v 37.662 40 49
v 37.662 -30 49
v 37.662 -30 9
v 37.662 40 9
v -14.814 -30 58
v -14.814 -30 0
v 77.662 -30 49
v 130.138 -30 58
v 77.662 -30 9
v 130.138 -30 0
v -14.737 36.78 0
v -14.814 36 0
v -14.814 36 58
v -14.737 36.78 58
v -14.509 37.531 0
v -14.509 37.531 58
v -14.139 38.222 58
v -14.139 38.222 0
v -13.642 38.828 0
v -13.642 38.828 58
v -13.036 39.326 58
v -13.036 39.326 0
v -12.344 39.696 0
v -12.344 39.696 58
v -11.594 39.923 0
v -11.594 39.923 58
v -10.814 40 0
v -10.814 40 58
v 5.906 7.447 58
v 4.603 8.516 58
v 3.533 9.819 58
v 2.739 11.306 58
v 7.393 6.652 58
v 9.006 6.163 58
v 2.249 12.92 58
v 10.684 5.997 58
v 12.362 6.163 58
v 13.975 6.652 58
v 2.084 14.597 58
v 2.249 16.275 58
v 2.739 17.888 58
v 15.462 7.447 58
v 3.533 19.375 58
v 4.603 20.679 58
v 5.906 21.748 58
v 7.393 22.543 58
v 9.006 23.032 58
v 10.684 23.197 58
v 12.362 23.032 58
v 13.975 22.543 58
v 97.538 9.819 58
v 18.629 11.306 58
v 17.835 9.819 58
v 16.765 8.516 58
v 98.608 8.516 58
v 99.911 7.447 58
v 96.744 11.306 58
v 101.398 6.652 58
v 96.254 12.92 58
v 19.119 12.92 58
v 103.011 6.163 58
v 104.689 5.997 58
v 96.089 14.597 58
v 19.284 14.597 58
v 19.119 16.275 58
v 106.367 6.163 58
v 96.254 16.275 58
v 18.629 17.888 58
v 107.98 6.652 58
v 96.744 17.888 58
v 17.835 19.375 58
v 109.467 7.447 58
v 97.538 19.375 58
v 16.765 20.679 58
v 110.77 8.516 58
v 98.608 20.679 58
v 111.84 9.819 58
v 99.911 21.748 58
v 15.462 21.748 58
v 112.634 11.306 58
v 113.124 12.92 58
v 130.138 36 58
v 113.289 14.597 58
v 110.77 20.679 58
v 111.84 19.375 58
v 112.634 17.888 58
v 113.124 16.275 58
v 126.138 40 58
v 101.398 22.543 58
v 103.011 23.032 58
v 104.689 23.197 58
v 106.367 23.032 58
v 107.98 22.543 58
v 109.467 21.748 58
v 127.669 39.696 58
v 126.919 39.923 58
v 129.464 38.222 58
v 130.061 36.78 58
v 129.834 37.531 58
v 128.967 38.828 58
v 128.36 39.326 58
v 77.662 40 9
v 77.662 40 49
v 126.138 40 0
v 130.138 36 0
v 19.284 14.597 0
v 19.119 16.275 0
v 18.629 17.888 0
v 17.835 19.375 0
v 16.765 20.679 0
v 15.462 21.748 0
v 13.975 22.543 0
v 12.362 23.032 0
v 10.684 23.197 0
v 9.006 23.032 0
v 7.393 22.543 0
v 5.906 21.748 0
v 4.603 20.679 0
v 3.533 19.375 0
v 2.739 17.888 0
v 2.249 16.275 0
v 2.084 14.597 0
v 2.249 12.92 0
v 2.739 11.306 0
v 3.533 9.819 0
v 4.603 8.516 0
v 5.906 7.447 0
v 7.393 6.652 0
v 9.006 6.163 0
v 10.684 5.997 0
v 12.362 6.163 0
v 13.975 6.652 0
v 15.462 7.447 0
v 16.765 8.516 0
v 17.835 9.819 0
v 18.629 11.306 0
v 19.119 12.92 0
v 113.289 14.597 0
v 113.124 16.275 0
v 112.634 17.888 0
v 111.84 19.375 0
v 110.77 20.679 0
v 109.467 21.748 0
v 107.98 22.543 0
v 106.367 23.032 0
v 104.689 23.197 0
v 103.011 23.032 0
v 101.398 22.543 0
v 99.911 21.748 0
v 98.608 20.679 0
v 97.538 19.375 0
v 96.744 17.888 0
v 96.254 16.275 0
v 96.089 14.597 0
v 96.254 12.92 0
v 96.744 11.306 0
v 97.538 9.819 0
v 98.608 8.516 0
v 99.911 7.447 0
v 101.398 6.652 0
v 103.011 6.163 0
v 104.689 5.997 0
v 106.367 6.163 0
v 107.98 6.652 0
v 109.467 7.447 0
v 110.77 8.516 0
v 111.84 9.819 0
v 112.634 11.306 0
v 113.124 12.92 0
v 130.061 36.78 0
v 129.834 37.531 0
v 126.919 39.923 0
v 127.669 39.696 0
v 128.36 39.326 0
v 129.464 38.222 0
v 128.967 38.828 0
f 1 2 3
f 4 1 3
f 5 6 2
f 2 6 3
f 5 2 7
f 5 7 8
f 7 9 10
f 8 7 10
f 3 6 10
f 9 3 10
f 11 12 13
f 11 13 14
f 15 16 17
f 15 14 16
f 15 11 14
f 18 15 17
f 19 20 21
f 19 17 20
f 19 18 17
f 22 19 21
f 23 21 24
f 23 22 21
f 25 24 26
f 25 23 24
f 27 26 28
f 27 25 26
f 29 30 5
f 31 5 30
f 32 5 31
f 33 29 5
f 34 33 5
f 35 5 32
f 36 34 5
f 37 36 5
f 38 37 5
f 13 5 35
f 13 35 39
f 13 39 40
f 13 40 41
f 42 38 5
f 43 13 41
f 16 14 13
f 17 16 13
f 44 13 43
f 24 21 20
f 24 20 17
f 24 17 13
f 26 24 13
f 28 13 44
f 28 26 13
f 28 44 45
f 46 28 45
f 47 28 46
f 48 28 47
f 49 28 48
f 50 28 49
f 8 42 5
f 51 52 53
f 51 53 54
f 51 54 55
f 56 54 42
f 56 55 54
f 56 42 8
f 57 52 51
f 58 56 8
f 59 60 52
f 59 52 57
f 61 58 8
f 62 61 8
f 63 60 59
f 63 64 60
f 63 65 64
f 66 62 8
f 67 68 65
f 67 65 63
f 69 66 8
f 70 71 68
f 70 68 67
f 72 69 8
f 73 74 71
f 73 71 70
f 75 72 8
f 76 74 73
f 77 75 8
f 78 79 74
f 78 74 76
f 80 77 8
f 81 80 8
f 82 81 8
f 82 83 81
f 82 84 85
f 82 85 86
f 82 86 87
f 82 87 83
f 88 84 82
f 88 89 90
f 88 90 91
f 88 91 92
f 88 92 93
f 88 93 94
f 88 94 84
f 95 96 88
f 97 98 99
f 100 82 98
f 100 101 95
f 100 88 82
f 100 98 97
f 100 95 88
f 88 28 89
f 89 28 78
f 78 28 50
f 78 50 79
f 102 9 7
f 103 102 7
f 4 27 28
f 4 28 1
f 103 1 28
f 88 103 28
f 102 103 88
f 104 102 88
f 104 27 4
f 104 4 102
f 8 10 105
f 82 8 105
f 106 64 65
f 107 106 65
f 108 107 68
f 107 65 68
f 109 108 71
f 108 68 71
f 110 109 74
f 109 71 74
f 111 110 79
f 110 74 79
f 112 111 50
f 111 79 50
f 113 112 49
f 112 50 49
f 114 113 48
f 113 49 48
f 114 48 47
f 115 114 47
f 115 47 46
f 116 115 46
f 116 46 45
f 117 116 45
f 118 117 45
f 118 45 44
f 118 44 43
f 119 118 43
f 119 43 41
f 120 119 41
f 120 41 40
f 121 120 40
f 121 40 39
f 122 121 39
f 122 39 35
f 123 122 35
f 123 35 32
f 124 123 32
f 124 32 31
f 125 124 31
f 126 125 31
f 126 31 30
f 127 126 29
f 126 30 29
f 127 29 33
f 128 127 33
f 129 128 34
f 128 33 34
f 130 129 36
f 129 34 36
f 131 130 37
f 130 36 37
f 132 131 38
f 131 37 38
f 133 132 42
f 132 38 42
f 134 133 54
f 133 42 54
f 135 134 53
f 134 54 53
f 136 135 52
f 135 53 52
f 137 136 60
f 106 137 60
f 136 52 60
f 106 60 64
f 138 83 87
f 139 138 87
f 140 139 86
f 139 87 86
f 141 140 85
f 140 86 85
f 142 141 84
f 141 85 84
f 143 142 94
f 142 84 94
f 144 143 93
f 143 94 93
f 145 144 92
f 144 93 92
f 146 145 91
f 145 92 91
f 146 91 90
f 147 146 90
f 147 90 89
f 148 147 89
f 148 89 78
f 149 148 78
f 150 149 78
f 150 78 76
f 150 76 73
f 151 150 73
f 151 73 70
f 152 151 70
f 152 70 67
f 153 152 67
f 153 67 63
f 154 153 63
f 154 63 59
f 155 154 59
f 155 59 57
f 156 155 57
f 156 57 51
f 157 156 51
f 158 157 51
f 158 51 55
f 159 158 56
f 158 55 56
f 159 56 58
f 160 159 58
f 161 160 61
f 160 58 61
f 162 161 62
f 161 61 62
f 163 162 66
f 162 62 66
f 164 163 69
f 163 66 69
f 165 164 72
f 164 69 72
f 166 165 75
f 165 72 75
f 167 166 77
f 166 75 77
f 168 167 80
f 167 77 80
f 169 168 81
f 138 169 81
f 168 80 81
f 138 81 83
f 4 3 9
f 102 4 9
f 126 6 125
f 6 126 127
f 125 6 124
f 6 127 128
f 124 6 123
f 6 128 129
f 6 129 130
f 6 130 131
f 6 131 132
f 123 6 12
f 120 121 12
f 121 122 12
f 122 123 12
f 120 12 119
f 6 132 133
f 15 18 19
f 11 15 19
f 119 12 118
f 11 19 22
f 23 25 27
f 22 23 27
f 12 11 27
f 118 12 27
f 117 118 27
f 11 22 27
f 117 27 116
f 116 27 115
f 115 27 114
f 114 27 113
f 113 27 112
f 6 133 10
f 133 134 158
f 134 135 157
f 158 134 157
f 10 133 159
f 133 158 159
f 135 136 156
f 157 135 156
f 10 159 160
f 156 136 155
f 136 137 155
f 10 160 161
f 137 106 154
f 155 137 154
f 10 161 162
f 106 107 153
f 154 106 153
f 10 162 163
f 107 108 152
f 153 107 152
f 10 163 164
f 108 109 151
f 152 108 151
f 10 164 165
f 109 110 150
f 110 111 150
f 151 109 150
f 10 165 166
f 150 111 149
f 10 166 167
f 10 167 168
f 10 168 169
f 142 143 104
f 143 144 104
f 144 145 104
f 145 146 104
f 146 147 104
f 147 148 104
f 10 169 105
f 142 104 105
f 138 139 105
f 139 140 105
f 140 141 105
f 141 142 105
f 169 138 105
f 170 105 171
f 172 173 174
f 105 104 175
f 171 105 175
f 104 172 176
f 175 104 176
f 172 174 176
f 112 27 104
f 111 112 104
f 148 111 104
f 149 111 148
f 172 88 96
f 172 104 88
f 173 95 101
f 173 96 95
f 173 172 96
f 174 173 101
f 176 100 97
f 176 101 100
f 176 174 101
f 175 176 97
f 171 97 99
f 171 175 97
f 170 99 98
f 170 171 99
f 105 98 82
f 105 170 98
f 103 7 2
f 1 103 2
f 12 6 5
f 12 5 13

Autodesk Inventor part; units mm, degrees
ref_plane "YZ Plane" through (0, 0, 0) normal (1, 0, 0) x (0, 1, 0)
ref_plane "XZ Plane" through (0, 0, 0) normal (0, 1, 0) x (-1, 0, 0)
ref_plane "XY Plane" through (0, 0, 0) normal (0, 0, 1) x (1, 0, 0)
sketch "Sketch1" plane through (0, 0, 0) normal (0, 0, 1) x (1, 0, 0)
  line L0 (130.1382, 2) -> (130.1382, 24.0208)
  line L1 (114.1591, 40) -> (3.1591, 40)
  line L2 (1.1591, -30) -> (130.1382, -30)
  line L3 (130.1382, -30) -> (130.1382, 2)
  line L4 (1.1591, -30) -> (-14.8135, -30)
  line L5 (-14.8135, -30) -> (-14.8135, 37.6368)
  line L6 (114.1591, 40) -> (126.1382, 40)
  line L7 (130.1382, 36) -> (130.1382, 24.0208)
  line L8 (126.1382, 40) -> (126.1382, 40)
  line L9 (130.1382, 36) -> (130.1382, 36)
  line L10 (-14.8135, 37.6368) -> (-14.8135, 36)
  line L11 (-10.8135, 40) -> (3.1591, 40)
  arc A0 (-10.8135, 40) -> (-14.8135, 36) centre (-10.8135, 36) ccw
  arc A1 (130.1382, 36) -> (126.1382, 40) centre (126.1382, 36) ccw
  circle A2 centre (104.5, 18) radius 8.6
  circle A3 centre (10.5, 18) radius 8.6
  point P0 (130.1382, 40)
  point P1 (-14.8135, 40)
  dimension "d41" = 4
extrude "Extrusion1" add sketch "Sketch1" along normal blind 58 contours L3 L2 L4 L5 A0 L11 L1 L6 A1 L7 L0 | A2 | A3
sketch "Sketch3" plane through (0, 0, 58) normal (0, 0, 1) x (1, 0, 0)
  circle A0 centre (104.5, 18) radius 10.5 projected
  circle A1 centre (10.495, 18) radius 10.5
  point P0 (0, 0)
  dimension "d28" = 21
extrude "Extrusion3" cut sketch "Sketch3" against normal blind 90 contours A1
sketch "Sketch4" plane through (-14.8135, 40, 0) normal (0, 1, 0) x (1, 0, 0)
  line L0 (52.4758, -29) -> (52.4758, -9)
  line L1 (52.4758, -9) -> (72.4758, -9)
  line L2 (52.4758, -9) -> (92.4758, -9)
  line L3 (92.4758, -9) -> (92.4758, -49)
  line L4 (92.4758, -49) -> (52.4758, -49)
  line L5 (52.4758, -49) -> (52.4758, -9)
  point P0 (14.8135, 0)
  dimension "d31" = 20
  dimension "d32" = 20
  dimension "d33" = 40
  dimension "d34" = 40
extrude "Extrusion4" cut sketch "Sketch4" against normal blind 70
sketch "Sketch5" plane through (0, 0, 0) normal (0, 0, -1) x (-1, 0, 0)
  point P0 (0, 0)
sketch "Sketch6" plane through (0, 0, 58) normal (0, 0, 1) x (1, 0, 0)
  circle A0 centre (10.495, 18) radius 10.5 projected
  circle A1 centre (10.495, 18) radius 10.5
  point P0 (0, 0)
extrude "Extrusion5" add sketch "Sketch6" against normal blind 58
sketch "Sketch7" plane through (0, 0, 58) normal (0, 0, 1) x (1, 0, 0)
  line L0 (-14.8135, 36) -> (-14.8135, -30) projected
  line L1 (130.1382, -30) -> (130.1382, 36) projected
  line L2 (-14.8135, 14.5974) -> (130.1865, 14.5974)
  line L3 (57.6865, 14.5974) -> (10.684, 14.5974)
  line L4 (10.684, 14.5974) -> (104.689, 14.5974)
  circle A0 centre (104.689, 14.5974) radius 8.6
  circle A1 centre (10.684, 14.5974) radius 8.6
  point P0 (0, 0)
  dimension "d48" = 47.0025
  dimension "d49" = 94.005
  dimension "d50" = 17.2
  dimension "d51" = 17.2
extrude "Extrusion6" cut sketch "Sketch7" against normal blind 58
thread "Thread5" size "M18x2.5" class "6H" standard "ANSI Metric M Profile" full length
thread "Thread6" size "M18x2.5" class "6H" standard "ANSI Metric M Profile" full length
properties part number "project_rough_mover"
